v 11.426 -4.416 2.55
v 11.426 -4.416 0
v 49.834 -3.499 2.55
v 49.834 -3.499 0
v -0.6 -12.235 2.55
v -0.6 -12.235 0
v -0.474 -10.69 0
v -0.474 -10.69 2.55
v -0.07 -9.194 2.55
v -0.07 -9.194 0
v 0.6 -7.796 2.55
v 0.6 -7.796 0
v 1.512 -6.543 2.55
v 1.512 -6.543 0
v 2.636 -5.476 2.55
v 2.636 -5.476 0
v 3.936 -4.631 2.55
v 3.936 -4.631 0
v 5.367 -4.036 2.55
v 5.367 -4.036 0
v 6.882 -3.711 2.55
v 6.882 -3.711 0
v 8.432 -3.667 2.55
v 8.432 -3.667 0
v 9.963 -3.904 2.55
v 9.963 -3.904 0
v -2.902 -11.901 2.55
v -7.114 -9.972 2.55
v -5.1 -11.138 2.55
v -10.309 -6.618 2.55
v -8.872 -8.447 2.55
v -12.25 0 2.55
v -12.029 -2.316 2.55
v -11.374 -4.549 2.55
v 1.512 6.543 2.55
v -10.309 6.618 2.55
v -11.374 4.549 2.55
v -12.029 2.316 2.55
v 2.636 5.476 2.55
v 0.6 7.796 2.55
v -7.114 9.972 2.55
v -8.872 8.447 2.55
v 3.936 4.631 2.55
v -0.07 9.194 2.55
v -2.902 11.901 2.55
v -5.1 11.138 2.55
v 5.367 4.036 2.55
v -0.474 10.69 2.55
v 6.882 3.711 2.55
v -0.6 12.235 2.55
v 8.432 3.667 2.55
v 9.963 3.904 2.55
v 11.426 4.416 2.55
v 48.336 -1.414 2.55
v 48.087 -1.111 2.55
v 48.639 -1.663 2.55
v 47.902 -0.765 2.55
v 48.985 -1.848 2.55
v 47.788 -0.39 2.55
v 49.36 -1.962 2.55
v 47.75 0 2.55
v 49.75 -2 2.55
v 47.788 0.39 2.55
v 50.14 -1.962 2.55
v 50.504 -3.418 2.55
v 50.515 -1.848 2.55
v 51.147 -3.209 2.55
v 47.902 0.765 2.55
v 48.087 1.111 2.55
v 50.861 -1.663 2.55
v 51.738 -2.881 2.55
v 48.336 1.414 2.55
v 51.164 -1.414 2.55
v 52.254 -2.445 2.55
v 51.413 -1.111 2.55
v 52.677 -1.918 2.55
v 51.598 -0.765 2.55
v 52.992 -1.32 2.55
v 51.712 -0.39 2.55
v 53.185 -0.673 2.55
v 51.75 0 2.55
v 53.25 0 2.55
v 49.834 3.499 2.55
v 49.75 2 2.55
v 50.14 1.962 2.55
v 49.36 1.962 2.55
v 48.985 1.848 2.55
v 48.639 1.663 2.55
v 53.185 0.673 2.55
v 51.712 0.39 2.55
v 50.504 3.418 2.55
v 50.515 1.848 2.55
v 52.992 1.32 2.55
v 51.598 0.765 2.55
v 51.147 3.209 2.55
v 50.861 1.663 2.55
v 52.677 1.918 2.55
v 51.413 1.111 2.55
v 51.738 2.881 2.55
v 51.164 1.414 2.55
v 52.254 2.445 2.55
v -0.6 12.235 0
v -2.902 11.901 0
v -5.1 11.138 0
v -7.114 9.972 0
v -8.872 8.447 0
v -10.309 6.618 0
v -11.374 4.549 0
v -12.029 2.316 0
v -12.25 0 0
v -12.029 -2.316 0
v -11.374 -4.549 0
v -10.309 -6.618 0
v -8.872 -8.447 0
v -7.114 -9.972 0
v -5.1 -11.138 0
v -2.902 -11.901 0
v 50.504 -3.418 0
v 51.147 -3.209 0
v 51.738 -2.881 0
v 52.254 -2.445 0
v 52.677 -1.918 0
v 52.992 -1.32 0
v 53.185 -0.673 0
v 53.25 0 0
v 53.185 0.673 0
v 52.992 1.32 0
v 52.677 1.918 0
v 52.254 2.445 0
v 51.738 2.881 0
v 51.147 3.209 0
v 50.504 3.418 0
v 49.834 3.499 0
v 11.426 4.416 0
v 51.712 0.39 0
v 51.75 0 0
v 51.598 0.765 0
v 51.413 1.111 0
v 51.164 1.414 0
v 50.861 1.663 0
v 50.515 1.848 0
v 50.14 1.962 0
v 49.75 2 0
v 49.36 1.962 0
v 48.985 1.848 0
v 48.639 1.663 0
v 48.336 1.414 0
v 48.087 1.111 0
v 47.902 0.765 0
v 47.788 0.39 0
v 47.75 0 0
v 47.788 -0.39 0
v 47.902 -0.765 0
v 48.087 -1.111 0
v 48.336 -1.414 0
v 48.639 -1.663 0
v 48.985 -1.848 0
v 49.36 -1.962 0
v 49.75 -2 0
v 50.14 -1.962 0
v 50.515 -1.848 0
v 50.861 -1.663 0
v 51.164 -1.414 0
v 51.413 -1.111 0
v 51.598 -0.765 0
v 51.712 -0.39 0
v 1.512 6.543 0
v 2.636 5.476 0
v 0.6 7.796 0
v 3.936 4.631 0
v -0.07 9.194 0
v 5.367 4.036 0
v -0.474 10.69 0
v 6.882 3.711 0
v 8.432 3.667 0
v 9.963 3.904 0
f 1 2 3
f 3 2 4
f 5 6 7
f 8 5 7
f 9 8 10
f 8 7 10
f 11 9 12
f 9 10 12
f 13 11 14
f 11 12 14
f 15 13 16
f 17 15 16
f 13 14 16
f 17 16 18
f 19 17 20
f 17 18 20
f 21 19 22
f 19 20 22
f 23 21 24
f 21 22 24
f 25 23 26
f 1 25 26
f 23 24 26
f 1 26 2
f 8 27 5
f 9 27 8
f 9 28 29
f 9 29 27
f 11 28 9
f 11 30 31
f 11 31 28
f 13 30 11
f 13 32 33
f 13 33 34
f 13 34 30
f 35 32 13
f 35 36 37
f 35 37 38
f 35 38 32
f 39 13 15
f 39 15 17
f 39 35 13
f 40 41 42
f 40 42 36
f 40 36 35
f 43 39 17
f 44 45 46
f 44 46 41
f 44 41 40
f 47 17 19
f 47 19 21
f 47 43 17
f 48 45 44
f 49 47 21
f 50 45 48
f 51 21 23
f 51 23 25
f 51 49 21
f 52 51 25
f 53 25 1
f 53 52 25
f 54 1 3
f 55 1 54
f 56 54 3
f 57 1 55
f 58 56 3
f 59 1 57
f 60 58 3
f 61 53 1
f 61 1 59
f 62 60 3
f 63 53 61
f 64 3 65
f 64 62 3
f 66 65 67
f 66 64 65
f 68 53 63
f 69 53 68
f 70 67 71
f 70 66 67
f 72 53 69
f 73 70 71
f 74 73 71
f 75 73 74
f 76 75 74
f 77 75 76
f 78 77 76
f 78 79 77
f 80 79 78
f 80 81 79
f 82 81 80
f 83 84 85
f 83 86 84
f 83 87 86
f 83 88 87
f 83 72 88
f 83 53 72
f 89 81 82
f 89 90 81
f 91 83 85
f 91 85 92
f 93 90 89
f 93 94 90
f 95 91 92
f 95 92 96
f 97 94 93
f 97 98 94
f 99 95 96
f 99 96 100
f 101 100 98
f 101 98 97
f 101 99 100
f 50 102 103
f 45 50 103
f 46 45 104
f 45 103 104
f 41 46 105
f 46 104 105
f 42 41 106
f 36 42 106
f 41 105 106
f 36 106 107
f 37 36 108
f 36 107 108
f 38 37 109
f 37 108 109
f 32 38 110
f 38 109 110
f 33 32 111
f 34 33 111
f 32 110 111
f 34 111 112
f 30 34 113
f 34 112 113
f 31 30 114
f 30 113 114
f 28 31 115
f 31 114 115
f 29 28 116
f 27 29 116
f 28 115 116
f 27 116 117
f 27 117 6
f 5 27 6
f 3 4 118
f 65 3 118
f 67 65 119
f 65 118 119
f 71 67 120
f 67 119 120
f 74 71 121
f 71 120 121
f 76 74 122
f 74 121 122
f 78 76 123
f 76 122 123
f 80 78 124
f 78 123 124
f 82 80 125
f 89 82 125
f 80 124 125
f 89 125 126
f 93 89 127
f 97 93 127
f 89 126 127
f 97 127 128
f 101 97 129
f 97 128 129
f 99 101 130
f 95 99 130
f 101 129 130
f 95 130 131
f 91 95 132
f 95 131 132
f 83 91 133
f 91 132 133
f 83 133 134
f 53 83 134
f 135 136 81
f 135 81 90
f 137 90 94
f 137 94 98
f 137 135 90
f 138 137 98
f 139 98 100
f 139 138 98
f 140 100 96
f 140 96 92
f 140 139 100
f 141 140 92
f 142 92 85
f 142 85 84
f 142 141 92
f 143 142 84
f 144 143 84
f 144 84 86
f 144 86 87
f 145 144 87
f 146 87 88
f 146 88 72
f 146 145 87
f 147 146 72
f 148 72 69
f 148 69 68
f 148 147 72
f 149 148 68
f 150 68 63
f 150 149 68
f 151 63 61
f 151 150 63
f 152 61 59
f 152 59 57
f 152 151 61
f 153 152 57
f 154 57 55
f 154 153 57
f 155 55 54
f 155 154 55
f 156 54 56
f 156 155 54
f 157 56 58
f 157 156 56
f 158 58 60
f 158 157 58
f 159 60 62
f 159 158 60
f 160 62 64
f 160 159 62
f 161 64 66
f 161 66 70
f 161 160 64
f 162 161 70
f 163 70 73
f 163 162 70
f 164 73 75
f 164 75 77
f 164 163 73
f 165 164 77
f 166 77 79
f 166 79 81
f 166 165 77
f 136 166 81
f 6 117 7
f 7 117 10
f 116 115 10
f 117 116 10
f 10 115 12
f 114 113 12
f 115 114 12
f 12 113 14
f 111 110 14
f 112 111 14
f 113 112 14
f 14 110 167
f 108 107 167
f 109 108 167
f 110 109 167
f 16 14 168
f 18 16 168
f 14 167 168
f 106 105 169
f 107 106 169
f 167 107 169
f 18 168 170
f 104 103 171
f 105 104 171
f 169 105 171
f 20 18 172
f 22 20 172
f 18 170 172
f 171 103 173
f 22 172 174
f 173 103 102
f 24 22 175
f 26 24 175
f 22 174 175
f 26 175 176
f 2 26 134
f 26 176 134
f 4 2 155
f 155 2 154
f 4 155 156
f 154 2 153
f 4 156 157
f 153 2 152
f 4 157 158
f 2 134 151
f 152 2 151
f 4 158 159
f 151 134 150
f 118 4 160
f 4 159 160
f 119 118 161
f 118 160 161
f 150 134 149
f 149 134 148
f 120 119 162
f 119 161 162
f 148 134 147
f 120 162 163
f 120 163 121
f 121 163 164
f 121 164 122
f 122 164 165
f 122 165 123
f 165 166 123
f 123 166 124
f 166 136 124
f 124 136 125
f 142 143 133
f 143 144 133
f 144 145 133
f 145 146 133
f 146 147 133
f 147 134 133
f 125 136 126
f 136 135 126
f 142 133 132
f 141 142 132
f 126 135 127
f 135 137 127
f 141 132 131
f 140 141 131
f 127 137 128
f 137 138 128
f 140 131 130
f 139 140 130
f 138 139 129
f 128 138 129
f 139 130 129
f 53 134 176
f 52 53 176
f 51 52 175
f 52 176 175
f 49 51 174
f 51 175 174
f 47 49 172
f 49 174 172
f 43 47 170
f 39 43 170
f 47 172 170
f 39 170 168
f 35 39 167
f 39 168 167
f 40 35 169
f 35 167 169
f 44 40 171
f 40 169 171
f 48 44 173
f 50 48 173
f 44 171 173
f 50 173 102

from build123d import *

# Parameters (mm, degrees)
F0_R     = 2
F1_DEPTH = 2.55


with BuildPart() as f1:
    # F0 (on Top) → F1 (new body)
    with BuildSketch(Plane.XY):
        with BuildLine():
            ThreePointArc((11.426351, 4.415994), (3.266568, 5.023899), (-0.599572, 12.235318))
            ThreePointArc((-0.599572, 12.235318), (-12.25, 0), (-0.599572, -12.235318))
            ThreePointArc((-0.599572, -12.235318), (3.266568, -5.023899), (11.426351, -4.415994))
            Line((11.426351, -4.415994), (49.83354, -3.499003))
            ThreePointArc((49.83354, -3.499003), (53.25, 0), (49.83354, 3.499003))
            Line((49.83354, 3.499003), (11.426351, 4.415994))
        make_face()
        with Locations((49.75, 0)):
            Circle(F0_R, mode=Mode.SUBTRACT)
    extrude(amount=F1_DEPTH)


solid = f1.part
